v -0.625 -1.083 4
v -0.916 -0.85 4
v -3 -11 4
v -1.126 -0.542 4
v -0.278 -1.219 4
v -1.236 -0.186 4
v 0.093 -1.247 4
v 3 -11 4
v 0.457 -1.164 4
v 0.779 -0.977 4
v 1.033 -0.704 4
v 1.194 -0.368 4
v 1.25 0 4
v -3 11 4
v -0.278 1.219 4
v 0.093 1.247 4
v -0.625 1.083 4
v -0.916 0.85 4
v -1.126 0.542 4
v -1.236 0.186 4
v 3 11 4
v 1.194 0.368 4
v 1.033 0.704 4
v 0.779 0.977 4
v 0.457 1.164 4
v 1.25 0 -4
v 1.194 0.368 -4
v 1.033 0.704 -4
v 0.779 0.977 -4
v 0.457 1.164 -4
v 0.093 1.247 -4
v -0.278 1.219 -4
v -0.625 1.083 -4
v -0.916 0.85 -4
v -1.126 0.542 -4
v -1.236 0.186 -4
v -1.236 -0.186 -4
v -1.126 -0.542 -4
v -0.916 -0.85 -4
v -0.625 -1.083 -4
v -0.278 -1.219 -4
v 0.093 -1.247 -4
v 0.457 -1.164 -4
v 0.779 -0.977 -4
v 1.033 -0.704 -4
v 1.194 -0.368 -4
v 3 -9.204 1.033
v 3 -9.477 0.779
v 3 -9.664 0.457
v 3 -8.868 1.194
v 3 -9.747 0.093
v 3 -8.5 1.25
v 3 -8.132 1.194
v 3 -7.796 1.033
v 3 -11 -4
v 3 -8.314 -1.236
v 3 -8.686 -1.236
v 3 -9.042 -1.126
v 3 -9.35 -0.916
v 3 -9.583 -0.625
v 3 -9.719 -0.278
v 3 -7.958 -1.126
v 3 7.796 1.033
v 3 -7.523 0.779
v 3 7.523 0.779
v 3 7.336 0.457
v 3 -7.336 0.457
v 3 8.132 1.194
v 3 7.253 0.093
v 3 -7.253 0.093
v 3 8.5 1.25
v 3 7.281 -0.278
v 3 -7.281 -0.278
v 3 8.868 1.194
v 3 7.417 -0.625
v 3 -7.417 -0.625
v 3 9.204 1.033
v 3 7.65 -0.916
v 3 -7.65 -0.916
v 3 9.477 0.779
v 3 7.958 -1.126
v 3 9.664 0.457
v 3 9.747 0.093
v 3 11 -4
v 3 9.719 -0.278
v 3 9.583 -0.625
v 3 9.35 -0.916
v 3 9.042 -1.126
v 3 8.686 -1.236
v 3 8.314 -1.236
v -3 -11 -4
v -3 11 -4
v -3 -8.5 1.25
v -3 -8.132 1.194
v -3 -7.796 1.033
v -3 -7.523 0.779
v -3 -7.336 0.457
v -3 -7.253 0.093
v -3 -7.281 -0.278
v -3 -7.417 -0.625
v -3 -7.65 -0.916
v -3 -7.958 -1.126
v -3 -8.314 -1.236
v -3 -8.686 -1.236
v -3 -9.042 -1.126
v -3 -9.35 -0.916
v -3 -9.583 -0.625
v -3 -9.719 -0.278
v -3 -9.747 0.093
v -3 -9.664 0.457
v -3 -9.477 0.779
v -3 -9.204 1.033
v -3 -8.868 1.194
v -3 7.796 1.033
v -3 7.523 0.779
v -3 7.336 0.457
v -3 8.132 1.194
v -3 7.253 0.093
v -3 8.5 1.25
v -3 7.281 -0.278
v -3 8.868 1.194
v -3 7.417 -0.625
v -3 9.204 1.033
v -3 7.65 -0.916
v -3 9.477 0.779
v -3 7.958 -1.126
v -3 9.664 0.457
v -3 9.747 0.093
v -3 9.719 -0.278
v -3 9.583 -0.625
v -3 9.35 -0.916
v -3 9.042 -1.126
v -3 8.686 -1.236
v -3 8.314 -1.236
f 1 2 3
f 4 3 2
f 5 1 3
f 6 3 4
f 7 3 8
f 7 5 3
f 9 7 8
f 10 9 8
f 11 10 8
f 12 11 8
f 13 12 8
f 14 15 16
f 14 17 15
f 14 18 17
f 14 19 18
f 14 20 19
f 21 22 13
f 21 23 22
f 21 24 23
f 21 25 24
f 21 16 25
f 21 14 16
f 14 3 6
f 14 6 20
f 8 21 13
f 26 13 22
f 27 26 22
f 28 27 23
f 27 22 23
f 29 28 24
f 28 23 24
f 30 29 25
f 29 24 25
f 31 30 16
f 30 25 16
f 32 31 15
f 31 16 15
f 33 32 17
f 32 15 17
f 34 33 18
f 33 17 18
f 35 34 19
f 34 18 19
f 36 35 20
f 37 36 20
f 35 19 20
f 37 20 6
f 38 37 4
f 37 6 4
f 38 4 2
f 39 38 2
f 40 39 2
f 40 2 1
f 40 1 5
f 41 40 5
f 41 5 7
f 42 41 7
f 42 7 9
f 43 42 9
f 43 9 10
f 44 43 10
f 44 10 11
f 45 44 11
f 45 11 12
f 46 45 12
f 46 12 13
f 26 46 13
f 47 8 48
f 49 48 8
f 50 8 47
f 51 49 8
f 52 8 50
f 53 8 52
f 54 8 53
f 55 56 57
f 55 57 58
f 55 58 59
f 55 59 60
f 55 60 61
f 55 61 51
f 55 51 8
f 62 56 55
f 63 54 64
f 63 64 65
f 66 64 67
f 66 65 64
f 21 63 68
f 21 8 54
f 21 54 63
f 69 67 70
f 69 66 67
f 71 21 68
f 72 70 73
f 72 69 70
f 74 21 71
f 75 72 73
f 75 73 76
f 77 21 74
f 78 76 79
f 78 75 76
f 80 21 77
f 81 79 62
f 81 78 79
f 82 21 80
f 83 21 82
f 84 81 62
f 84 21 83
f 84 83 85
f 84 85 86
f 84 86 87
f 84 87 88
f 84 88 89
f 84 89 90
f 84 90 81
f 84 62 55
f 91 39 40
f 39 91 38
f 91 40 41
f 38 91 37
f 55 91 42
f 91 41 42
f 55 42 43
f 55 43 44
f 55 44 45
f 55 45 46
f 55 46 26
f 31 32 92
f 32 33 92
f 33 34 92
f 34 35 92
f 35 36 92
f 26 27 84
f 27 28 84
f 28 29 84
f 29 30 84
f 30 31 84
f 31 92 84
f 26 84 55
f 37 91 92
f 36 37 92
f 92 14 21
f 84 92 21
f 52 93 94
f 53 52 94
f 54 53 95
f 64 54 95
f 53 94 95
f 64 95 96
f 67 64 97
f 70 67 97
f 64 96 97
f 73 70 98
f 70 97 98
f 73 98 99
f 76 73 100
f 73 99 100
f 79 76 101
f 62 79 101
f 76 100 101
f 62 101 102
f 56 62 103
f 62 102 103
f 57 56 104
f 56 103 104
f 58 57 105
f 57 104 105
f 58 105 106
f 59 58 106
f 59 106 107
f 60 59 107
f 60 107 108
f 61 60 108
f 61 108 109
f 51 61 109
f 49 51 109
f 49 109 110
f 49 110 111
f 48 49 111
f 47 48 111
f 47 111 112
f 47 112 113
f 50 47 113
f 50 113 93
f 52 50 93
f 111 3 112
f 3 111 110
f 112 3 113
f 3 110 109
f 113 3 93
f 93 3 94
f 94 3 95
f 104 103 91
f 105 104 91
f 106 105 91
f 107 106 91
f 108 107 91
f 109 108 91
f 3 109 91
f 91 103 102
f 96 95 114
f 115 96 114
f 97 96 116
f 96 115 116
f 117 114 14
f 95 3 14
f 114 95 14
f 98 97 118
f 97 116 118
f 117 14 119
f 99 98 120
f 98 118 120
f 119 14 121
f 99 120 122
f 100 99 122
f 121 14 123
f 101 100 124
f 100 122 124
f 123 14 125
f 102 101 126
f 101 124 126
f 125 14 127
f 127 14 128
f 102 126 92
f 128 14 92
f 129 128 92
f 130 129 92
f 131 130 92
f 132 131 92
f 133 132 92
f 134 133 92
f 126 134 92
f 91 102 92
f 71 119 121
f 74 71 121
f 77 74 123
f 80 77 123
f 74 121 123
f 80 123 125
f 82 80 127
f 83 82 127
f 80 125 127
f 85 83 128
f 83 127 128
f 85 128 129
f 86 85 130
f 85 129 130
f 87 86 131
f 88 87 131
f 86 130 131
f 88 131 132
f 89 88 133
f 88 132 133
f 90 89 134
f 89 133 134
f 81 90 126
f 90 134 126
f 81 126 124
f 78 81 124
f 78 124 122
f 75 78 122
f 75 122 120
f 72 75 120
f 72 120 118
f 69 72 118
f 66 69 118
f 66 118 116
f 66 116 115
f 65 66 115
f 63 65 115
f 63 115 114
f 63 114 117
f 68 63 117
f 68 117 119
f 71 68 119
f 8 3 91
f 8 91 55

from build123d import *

# Parameters (mm, degrees)
SKETCH_1_W          = 6
SKETCH_1_H          = 8
EXTRUDE_1_DEPTH     = 11
SKETCH_2_R          = 1.25
CUT_EXTRUDE_1_DEPTH = 14.928388277
SKETCH_3_R          = 1.25
CUT_EXTRUDE_2_DEPTH = 14.152946438


with BuildPart() as part:
    # 草图1 → 凸台-拉伸1 (new, symmetric)
    with BuildSketch(Plane(origin=(0, 0, 0), x_dir=(1, 0, 0), z_dir=(0, 1, 0))):
        Rectangle(SKETCH_1_W, SKETCH_1_H)
    extrude(amount=EXTRUDE_1_DEPTH, both=True)

    # 草图2 → 切除-拉伸1 (cut, through all)
    with BuildSketch(Plane.XY.offset(4)):
        Circle(SKETCH_2_R)
    extrude(amount=-CUT_EXTRUDE_1_DEPTH, mode=Mode.SUBTRACT)

    # 草图3 → 切除-拉伸2 (cut, through all)
    with BuildSketch(Plane.ZY.offset(3)):
        with Locations((0, 8.5)):
            Circle(SKETCH_3_R)
        with Locations((0, -8.5)):
            Circle(SKETCH_3_R)
    extrude(amount=-CUT_EXTRUDE_2_DEPTH, mode=Mode.SUBTRACT)


solid = part.part
